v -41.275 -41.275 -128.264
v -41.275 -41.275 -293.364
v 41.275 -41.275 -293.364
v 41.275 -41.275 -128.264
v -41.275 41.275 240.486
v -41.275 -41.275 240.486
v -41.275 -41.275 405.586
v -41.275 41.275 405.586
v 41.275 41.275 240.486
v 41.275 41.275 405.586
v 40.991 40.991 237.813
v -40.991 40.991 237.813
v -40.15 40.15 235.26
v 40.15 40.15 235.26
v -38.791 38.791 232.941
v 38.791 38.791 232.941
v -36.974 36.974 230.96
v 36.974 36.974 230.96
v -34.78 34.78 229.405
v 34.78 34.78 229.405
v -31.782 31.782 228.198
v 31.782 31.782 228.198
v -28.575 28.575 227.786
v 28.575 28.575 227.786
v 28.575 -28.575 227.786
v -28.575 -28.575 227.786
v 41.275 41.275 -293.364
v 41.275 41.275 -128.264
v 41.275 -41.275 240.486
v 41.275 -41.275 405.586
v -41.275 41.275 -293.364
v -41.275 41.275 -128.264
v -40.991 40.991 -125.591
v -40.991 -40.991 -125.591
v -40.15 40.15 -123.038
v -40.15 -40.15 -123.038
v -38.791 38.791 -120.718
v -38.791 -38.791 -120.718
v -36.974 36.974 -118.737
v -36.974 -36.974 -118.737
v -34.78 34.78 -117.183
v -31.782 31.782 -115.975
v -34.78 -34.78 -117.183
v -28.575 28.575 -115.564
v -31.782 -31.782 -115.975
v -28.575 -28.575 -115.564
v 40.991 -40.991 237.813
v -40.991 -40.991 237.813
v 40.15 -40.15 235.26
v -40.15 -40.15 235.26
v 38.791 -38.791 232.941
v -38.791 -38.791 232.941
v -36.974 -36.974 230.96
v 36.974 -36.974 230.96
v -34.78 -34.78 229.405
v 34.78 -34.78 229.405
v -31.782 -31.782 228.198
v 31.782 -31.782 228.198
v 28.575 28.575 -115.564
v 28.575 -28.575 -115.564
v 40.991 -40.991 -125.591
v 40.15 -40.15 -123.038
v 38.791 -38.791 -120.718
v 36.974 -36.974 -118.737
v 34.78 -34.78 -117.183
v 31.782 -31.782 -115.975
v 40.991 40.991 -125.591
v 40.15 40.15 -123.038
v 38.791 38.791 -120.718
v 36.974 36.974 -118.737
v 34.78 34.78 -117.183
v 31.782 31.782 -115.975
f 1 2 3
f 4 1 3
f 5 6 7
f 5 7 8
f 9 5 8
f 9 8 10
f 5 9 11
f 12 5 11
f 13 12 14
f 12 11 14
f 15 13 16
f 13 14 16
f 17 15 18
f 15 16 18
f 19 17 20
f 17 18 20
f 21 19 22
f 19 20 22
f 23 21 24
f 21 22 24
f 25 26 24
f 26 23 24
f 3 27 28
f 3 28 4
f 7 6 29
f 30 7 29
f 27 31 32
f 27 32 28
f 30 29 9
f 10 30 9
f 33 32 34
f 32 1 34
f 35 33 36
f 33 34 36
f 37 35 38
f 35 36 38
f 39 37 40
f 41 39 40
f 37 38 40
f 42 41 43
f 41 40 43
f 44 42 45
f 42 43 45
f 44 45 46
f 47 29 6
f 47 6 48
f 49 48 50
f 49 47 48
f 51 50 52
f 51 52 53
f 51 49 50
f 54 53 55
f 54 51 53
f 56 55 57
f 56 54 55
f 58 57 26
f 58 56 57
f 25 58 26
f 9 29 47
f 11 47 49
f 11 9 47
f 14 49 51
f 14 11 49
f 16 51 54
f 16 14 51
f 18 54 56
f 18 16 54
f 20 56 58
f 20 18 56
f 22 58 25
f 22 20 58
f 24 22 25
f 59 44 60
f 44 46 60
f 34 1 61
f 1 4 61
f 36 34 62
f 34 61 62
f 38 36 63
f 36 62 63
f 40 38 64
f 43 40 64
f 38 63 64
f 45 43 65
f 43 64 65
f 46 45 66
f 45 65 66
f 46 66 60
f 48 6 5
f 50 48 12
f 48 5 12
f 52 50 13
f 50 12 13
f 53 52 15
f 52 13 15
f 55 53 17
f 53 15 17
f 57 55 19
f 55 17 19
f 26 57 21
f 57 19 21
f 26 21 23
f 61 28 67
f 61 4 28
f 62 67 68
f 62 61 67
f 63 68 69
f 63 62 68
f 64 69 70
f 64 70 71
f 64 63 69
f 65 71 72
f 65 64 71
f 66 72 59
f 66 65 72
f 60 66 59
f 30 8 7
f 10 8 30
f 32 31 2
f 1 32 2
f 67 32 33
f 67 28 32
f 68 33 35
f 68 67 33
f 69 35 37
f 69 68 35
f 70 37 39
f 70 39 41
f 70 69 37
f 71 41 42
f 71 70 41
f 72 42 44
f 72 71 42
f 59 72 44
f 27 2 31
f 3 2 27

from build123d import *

# Parameters (mm, degrees)
F2_W     = 82.55
F2_H     = 82.55
F3_DEPTH = 177.8
F4_W     = 82.55
F4_H     = 82.55
F5_DEPTH = 177.8
F6_R     = 12.7
F7_R     = 12.7


# Not quite as in the source:
# - the program builds the solid bodies; features that only make, move or delete a surface that nothing else refers to are left out


with BuildPart() as f3:
    # F2 (on face) → F3 (new body)
    with BuildSketch(Plane(origin=(0, 0, -115.5637845452), x_dir=(1, 0, 0), z_dir=(0, 0, -1))):
        Rectangle(F2_W, F2_H)
    extrude(amount=F3_DEPTH)

    # F7
    f7_edges = [f3.edges().sort_by_distance(p)[0] for p in [
        (0, 41.275, -115.563785),
        (41.275, 0, -115.563785),
        (0, -41.275, -115.563785),
        (-41.275, 0, -115.563785),
    ]]
    fillet(f7_edges, radius=F7_R)


with BuildPart() as f5:
    # F4 (on face) → F5 (new body)
    with BuildSketch(Plane.XY.offset(227.7861535549)):
        Rectangle(F4_W, F4_H)
    extrude(amount=F5_DEPTH)

    # F6
    f6_edges = [f5.edges().sort_by_distance(p)[0] for p in [
        (0, -41.275, 227.786154),
        (41.275, 0, 227.786154),
        (0, 41.275, 227.786154),
        (-41.275, 0, 227.786154),
    ]]
    fillet(f6_edges, radius=F6_R)


solid = Compound([f3.part, f5.part])
